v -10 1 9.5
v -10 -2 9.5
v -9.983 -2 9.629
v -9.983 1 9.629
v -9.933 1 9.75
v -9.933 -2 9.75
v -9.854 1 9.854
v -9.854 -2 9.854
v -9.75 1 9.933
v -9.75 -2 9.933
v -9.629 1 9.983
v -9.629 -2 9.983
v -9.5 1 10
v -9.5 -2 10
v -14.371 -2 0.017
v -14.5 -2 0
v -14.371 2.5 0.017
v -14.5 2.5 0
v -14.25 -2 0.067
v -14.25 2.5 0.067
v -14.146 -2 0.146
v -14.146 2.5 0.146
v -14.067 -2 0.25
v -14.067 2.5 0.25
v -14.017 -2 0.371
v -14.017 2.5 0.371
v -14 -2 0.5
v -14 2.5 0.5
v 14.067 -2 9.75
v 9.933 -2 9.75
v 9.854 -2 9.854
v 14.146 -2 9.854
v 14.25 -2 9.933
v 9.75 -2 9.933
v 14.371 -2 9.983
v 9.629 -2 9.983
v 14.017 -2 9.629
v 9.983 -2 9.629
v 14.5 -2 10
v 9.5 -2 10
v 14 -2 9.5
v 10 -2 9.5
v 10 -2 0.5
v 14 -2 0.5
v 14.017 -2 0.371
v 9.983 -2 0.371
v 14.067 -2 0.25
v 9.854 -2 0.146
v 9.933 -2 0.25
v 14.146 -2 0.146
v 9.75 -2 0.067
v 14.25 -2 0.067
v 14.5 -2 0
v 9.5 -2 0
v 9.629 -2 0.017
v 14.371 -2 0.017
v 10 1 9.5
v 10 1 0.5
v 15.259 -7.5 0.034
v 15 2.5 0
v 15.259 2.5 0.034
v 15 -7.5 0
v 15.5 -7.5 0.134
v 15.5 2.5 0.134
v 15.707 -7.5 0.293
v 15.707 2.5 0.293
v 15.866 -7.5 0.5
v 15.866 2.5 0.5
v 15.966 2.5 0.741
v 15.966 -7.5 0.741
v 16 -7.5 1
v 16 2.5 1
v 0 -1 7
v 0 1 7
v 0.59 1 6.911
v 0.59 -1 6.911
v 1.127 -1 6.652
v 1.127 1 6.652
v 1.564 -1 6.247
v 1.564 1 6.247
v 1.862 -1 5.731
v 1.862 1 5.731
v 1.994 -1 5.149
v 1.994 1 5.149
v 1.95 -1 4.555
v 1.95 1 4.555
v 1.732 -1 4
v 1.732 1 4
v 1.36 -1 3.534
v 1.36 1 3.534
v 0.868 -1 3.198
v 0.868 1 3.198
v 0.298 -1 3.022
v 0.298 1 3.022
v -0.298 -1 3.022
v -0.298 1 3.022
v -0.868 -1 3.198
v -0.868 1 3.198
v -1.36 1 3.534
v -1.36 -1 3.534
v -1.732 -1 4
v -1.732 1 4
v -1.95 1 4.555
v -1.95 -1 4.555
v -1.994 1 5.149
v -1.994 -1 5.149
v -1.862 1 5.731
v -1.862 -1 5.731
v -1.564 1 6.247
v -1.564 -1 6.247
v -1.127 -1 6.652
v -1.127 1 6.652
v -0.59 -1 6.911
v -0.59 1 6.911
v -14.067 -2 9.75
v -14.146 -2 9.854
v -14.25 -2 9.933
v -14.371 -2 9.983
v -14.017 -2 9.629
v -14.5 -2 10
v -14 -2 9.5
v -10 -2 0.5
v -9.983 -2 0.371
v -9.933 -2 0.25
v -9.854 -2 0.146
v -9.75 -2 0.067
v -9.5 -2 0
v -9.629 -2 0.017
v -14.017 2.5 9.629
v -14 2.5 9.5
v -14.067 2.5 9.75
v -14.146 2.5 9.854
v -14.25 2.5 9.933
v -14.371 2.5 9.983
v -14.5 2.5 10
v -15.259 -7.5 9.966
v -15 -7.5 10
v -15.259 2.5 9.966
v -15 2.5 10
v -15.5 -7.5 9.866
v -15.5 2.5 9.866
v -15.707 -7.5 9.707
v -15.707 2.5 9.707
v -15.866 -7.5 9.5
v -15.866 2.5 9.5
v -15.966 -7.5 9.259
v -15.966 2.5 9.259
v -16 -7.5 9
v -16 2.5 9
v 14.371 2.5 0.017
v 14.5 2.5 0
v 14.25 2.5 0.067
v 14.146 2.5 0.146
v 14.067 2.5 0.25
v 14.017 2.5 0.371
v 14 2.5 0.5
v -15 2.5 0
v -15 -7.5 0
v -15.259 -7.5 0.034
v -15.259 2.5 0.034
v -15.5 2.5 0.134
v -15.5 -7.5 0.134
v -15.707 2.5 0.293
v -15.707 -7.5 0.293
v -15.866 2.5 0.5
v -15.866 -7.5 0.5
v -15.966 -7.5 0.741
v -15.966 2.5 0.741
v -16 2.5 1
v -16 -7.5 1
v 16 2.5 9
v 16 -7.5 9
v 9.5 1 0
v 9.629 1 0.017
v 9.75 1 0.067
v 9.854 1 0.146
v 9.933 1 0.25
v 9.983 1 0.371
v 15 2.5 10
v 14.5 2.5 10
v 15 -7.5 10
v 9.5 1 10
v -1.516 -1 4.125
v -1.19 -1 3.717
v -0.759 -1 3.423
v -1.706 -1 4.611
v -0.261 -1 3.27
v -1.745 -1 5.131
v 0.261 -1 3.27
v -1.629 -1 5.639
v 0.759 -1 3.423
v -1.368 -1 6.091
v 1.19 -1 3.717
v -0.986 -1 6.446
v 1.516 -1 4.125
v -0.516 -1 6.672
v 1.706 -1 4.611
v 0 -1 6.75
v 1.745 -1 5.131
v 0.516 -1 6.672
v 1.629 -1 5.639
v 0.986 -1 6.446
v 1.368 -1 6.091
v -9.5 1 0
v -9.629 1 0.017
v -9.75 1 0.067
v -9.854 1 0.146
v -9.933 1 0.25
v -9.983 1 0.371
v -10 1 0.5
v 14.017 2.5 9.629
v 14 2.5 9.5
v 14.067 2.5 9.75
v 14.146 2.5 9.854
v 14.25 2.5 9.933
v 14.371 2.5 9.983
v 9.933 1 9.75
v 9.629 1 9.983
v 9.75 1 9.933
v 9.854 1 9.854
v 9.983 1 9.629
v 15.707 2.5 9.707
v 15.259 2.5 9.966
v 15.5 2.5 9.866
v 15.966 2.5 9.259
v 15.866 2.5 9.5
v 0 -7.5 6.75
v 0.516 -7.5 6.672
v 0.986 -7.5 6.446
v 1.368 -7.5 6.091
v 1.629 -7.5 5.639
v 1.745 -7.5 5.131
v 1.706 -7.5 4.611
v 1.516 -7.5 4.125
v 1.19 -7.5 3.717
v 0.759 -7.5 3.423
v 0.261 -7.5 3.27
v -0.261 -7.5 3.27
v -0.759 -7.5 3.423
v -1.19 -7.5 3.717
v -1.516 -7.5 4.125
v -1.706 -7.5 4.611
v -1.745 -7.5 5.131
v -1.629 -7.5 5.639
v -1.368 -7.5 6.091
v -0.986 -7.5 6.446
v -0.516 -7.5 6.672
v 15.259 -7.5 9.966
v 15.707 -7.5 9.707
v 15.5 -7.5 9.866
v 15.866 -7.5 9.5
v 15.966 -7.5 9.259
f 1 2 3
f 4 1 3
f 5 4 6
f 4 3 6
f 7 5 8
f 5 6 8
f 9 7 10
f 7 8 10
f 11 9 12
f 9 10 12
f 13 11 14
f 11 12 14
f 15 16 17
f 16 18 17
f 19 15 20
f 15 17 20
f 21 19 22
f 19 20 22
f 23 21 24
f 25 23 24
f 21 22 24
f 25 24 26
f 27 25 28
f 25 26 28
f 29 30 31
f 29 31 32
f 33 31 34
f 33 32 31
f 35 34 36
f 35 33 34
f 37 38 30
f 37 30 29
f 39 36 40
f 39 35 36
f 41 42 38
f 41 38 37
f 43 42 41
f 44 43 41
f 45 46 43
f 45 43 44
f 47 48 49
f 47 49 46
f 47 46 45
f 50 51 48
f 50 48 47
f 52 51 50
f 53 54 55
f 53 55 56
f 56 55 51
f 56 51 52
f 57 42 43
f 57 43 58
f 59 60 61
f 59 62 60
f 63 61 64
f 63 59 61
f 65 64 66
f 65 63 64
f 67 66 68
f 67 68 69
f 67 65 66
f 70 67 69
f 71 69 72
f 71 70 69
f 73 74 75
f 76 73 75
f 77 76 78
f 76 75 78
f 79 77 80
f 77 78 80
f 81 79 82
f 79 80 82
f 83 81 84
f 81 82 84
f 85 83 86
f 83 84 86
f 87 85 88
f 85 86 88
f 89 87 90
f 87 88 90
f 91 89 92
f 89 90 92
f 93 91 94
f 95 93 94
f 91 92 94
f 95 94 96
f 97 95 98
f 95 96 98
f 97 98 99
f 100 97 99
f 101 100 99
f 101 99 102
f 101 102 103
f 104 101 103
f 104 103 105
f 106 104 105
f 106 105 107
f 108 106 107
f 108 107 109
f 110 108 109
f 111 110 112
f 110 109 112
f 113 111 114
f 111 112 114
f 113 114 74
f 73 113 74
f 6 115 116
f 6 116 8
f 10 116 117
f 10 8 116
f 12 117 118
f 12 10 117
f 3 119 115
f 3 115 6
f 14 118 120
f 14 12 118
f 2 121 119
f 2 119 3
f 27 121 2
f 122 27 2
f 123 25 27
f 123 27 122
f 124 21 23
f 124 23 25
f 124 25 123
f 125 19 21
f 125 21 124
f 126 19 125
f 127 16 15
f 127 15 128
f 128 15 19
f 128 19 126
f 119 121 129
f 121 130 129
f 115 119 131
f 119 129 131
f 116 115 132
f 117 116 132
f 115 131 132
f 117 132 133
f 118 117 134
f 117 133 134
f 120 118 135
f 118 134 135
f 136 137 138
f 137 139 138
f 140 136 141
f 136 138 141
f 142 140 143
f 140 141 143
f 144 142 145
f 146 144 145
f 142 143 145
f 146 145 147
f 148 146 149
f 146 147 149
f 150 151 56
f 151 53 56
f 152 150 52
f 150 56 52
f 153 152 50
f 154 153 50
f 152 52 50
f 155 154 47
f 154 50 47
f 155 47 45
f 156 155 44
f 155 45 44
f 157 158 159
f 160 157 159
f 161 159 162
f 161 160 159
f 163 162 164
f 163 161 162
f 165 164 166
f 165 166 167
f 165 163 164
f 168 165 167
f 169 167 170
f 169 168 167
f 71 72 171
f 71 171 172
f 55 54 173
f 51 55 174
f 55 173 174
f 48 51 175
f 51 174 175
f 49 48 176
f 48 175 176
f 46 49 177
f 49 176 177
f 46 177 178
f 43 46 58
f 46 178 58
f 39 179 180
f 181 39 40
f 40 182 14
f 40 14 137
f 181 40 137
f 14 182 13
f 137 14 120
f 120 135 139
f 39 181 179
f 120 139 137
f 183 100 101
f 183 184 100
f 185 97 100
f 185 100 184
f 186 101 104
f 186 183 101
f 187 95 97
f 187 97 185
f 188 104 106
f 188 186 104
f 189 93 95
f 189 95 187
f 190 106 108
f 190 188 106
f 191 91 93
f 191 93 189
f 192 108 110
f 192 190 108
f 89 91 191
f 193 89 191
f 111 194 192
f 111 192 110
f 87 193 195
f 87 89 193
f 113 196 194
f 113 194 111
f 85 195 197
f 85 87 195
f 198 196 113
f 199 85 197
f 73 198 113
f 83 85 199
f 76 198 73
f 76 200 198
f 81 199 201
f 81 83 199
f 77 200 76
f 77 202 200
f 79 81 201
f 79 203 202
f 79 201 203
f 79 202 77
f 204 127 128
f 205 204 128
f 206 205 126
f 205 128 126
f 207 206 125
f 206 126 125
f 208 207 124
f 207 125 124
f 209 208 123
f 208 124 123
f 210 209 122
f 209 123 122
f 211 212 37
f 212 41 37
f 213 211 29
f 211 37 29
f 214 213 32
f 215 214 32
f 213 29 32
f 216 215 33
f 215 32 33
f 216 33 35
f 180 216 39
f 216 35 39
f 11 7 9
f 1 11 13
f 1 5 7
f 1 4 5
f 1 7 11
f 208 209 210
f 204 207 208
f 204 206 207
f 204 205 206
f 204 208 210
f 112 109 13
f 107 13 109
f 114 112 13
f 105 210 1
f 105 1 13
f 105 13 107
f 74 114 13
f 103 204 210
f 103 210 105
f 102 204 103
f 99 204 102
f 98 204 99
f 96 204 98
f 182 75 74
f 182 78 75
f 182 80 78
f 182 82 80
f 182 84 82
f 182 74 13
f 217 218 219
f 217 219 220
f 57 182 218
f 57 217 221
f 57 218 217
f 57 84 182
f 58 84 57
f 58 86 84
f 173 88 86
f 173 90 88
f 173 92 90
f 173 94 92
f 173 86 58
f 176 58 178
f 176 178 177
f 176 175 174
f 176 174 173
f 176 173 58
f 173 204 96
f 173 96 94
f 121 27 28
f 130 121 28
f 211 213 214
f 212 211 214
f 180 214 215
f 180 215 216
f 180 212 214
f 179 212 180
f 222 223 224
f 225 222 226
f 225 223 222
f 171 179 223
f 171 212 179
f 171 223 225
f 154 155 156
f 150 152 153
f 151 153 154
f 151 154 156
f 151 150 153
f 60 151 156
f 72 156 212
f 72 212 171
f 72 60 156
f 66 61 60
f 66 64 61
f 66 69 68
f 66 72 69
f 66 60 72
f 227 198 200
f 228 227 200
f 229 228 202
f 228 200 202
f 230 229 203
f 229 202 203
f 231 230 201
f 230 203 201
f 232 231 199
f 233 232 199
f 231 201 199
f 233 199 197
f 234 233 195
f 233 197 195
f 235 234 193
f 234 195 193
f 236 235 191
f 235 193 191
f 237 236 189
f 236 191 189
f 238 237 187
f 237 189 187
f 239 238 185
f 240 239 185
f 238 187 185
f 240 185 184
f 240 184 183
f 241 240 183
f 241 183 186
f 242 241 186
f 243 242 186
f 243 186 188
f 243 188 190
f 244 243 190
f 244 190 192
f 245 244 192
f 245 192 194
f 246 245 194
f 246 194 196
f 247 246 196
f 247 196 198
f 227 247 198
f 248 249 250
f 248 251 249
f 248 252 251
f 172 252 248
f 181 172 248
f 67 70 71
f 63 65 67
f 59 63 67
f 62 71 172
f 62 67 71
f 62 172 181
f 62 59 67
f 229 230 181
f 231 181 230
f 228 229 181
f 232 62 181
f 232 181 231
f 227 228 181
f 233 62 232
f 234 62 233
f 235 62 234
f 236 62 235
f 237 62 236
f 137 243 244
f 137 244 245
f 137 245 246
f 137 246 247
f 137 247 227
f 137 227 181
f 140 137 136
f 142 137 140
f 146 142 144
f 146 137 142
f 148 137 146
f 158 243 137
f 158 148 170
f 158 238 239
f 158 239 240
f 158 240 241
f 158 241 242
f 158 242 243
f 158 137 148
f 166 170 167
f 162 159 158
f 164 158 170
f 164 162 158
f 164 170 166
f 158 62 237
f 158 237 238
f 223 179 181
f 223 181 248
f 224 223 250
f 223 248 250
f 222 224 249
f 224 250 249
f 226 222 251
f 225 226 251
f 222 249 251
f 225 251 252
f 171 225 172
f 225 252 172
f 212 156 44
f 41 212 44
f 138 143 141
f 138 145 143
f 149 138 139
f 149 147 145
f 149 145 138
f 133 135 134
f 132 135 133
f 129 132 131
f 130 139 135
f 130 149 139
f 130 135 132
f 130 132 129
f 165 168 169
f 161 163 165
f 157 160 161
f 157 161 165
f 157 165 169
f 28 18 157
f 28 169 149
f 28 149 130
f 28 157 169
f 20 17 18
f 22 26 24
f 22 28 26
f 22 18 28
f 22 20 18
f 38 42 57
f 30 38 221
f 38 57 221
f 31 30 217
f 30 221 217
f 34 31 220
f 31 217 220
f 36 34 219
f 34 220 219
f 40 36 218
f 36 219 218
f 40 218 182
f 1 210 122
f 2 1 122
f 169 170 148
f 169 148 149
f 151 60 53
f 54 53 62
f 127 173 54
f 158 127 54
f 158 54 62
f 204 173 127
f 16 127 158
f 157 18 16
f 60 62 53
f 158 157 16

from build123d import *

# Parameters (mm, degrees)
BOSS_EXTRUDE1_DEPTH = 10
SKETCH2_R           = 1.75
CUT_EXTRUDE1_DEPTH  = 22.354156504
FILLET2_R           = 1
FILLET3_R           = 0.5
SKETCH4_W           = 20
SKETCH4_H           = 10
CUT_EXTRUDE3_DEPTH  = 1.5
SKETCH5_R           = 2
CUT_EXTRUDE4_DEPTH  = 2


with BuildPart() as part:
    # Sketch1 → Boss-Extrude1 (new body)
    with BuildSketch(Plane.XY):
        Polygon((-10, 2.5), (10, 2.5), (10, 0), (10, -2), (14, -2), (14, 0), (14, 2.5), (16, 2.5), (16, -7.5), (-16, -7.5), (-16, 2.5), (-14, 2.5), (-14, 0), (-14, -2), (-10, -2), (-10, 0), align=None)
    extrude(amount=BOSS_EXTRUDE1_DEPTH)

    # Sketch2 → Cut-Extrude1 (cut, through all)
    with BuildSketch(Plane(origin=(0, 2.5, 0), x_dir=(1, 0, 0), z_dir=(0, 1, 0))):
        with Locations(Location((0, -5, 0), (0, 0, 270))):
            Circle(SKETCH2_R)
    extrude(amount=-CUT_EXTRUDE1_DEPTH, mode=Mode.SUBTRACT)

    # Fillet2
    fillet2_edges = [part.edges().sort_by_distance(p)[0] for p in [
        (16, -2.5, 0),
        (-16, -2.5, 0),
        (-16, -2.5, 10),
        (16, -2.5, 10),
    ]]
    fillet(fillet2_edges, radius=FILLET2_R)

    # Fillet3
    fillet3_edges = [part.edges().sort_by_distance(p)[0] for p in [
        (-10, 0.25, 10),
        (14, 0.25, 0),
        (-14, 0.25, 0),
        (-10, 0.25, 0),
        (10, 0.25, 0),
        (-14, 0.25, 10),
        (10, 0.25, 10),
        (14, 0.25, 10),
    ]]
    fillet(fillet3_edges, radius=FILLET3_R)

    # Sketch4 → Cut-Extrude3 (cut)
    with BuildSketch(Plane(origin=(0, 2.5, 0), x_dir=(1, 0, 0), z_dir=(0, 1, 0))):
        with Locations((0, -5)):
            Rectangle(SKETCH4_W, SKETCH4_H)
    extrude(amount=-CUT_EXTRUDE3_DEPTH, mode=Mode.SUBTRACT)

    # Sketch5 → Cut-Extrude4 (cut)
    with BuildSketch(Plane(origin=(0, 1, 0), x_dir=(1, 0, 0), z_dir=(0, 1, 0))):
        with Locations(Location((0, -5, 0), (0, 0, 270))):
            Circle(SKETCH5_R)
    extrude(amount=-CUT_EXTRUDE4_DEPTH, mode=Mode.SUBTRACT)


solid = part.part
